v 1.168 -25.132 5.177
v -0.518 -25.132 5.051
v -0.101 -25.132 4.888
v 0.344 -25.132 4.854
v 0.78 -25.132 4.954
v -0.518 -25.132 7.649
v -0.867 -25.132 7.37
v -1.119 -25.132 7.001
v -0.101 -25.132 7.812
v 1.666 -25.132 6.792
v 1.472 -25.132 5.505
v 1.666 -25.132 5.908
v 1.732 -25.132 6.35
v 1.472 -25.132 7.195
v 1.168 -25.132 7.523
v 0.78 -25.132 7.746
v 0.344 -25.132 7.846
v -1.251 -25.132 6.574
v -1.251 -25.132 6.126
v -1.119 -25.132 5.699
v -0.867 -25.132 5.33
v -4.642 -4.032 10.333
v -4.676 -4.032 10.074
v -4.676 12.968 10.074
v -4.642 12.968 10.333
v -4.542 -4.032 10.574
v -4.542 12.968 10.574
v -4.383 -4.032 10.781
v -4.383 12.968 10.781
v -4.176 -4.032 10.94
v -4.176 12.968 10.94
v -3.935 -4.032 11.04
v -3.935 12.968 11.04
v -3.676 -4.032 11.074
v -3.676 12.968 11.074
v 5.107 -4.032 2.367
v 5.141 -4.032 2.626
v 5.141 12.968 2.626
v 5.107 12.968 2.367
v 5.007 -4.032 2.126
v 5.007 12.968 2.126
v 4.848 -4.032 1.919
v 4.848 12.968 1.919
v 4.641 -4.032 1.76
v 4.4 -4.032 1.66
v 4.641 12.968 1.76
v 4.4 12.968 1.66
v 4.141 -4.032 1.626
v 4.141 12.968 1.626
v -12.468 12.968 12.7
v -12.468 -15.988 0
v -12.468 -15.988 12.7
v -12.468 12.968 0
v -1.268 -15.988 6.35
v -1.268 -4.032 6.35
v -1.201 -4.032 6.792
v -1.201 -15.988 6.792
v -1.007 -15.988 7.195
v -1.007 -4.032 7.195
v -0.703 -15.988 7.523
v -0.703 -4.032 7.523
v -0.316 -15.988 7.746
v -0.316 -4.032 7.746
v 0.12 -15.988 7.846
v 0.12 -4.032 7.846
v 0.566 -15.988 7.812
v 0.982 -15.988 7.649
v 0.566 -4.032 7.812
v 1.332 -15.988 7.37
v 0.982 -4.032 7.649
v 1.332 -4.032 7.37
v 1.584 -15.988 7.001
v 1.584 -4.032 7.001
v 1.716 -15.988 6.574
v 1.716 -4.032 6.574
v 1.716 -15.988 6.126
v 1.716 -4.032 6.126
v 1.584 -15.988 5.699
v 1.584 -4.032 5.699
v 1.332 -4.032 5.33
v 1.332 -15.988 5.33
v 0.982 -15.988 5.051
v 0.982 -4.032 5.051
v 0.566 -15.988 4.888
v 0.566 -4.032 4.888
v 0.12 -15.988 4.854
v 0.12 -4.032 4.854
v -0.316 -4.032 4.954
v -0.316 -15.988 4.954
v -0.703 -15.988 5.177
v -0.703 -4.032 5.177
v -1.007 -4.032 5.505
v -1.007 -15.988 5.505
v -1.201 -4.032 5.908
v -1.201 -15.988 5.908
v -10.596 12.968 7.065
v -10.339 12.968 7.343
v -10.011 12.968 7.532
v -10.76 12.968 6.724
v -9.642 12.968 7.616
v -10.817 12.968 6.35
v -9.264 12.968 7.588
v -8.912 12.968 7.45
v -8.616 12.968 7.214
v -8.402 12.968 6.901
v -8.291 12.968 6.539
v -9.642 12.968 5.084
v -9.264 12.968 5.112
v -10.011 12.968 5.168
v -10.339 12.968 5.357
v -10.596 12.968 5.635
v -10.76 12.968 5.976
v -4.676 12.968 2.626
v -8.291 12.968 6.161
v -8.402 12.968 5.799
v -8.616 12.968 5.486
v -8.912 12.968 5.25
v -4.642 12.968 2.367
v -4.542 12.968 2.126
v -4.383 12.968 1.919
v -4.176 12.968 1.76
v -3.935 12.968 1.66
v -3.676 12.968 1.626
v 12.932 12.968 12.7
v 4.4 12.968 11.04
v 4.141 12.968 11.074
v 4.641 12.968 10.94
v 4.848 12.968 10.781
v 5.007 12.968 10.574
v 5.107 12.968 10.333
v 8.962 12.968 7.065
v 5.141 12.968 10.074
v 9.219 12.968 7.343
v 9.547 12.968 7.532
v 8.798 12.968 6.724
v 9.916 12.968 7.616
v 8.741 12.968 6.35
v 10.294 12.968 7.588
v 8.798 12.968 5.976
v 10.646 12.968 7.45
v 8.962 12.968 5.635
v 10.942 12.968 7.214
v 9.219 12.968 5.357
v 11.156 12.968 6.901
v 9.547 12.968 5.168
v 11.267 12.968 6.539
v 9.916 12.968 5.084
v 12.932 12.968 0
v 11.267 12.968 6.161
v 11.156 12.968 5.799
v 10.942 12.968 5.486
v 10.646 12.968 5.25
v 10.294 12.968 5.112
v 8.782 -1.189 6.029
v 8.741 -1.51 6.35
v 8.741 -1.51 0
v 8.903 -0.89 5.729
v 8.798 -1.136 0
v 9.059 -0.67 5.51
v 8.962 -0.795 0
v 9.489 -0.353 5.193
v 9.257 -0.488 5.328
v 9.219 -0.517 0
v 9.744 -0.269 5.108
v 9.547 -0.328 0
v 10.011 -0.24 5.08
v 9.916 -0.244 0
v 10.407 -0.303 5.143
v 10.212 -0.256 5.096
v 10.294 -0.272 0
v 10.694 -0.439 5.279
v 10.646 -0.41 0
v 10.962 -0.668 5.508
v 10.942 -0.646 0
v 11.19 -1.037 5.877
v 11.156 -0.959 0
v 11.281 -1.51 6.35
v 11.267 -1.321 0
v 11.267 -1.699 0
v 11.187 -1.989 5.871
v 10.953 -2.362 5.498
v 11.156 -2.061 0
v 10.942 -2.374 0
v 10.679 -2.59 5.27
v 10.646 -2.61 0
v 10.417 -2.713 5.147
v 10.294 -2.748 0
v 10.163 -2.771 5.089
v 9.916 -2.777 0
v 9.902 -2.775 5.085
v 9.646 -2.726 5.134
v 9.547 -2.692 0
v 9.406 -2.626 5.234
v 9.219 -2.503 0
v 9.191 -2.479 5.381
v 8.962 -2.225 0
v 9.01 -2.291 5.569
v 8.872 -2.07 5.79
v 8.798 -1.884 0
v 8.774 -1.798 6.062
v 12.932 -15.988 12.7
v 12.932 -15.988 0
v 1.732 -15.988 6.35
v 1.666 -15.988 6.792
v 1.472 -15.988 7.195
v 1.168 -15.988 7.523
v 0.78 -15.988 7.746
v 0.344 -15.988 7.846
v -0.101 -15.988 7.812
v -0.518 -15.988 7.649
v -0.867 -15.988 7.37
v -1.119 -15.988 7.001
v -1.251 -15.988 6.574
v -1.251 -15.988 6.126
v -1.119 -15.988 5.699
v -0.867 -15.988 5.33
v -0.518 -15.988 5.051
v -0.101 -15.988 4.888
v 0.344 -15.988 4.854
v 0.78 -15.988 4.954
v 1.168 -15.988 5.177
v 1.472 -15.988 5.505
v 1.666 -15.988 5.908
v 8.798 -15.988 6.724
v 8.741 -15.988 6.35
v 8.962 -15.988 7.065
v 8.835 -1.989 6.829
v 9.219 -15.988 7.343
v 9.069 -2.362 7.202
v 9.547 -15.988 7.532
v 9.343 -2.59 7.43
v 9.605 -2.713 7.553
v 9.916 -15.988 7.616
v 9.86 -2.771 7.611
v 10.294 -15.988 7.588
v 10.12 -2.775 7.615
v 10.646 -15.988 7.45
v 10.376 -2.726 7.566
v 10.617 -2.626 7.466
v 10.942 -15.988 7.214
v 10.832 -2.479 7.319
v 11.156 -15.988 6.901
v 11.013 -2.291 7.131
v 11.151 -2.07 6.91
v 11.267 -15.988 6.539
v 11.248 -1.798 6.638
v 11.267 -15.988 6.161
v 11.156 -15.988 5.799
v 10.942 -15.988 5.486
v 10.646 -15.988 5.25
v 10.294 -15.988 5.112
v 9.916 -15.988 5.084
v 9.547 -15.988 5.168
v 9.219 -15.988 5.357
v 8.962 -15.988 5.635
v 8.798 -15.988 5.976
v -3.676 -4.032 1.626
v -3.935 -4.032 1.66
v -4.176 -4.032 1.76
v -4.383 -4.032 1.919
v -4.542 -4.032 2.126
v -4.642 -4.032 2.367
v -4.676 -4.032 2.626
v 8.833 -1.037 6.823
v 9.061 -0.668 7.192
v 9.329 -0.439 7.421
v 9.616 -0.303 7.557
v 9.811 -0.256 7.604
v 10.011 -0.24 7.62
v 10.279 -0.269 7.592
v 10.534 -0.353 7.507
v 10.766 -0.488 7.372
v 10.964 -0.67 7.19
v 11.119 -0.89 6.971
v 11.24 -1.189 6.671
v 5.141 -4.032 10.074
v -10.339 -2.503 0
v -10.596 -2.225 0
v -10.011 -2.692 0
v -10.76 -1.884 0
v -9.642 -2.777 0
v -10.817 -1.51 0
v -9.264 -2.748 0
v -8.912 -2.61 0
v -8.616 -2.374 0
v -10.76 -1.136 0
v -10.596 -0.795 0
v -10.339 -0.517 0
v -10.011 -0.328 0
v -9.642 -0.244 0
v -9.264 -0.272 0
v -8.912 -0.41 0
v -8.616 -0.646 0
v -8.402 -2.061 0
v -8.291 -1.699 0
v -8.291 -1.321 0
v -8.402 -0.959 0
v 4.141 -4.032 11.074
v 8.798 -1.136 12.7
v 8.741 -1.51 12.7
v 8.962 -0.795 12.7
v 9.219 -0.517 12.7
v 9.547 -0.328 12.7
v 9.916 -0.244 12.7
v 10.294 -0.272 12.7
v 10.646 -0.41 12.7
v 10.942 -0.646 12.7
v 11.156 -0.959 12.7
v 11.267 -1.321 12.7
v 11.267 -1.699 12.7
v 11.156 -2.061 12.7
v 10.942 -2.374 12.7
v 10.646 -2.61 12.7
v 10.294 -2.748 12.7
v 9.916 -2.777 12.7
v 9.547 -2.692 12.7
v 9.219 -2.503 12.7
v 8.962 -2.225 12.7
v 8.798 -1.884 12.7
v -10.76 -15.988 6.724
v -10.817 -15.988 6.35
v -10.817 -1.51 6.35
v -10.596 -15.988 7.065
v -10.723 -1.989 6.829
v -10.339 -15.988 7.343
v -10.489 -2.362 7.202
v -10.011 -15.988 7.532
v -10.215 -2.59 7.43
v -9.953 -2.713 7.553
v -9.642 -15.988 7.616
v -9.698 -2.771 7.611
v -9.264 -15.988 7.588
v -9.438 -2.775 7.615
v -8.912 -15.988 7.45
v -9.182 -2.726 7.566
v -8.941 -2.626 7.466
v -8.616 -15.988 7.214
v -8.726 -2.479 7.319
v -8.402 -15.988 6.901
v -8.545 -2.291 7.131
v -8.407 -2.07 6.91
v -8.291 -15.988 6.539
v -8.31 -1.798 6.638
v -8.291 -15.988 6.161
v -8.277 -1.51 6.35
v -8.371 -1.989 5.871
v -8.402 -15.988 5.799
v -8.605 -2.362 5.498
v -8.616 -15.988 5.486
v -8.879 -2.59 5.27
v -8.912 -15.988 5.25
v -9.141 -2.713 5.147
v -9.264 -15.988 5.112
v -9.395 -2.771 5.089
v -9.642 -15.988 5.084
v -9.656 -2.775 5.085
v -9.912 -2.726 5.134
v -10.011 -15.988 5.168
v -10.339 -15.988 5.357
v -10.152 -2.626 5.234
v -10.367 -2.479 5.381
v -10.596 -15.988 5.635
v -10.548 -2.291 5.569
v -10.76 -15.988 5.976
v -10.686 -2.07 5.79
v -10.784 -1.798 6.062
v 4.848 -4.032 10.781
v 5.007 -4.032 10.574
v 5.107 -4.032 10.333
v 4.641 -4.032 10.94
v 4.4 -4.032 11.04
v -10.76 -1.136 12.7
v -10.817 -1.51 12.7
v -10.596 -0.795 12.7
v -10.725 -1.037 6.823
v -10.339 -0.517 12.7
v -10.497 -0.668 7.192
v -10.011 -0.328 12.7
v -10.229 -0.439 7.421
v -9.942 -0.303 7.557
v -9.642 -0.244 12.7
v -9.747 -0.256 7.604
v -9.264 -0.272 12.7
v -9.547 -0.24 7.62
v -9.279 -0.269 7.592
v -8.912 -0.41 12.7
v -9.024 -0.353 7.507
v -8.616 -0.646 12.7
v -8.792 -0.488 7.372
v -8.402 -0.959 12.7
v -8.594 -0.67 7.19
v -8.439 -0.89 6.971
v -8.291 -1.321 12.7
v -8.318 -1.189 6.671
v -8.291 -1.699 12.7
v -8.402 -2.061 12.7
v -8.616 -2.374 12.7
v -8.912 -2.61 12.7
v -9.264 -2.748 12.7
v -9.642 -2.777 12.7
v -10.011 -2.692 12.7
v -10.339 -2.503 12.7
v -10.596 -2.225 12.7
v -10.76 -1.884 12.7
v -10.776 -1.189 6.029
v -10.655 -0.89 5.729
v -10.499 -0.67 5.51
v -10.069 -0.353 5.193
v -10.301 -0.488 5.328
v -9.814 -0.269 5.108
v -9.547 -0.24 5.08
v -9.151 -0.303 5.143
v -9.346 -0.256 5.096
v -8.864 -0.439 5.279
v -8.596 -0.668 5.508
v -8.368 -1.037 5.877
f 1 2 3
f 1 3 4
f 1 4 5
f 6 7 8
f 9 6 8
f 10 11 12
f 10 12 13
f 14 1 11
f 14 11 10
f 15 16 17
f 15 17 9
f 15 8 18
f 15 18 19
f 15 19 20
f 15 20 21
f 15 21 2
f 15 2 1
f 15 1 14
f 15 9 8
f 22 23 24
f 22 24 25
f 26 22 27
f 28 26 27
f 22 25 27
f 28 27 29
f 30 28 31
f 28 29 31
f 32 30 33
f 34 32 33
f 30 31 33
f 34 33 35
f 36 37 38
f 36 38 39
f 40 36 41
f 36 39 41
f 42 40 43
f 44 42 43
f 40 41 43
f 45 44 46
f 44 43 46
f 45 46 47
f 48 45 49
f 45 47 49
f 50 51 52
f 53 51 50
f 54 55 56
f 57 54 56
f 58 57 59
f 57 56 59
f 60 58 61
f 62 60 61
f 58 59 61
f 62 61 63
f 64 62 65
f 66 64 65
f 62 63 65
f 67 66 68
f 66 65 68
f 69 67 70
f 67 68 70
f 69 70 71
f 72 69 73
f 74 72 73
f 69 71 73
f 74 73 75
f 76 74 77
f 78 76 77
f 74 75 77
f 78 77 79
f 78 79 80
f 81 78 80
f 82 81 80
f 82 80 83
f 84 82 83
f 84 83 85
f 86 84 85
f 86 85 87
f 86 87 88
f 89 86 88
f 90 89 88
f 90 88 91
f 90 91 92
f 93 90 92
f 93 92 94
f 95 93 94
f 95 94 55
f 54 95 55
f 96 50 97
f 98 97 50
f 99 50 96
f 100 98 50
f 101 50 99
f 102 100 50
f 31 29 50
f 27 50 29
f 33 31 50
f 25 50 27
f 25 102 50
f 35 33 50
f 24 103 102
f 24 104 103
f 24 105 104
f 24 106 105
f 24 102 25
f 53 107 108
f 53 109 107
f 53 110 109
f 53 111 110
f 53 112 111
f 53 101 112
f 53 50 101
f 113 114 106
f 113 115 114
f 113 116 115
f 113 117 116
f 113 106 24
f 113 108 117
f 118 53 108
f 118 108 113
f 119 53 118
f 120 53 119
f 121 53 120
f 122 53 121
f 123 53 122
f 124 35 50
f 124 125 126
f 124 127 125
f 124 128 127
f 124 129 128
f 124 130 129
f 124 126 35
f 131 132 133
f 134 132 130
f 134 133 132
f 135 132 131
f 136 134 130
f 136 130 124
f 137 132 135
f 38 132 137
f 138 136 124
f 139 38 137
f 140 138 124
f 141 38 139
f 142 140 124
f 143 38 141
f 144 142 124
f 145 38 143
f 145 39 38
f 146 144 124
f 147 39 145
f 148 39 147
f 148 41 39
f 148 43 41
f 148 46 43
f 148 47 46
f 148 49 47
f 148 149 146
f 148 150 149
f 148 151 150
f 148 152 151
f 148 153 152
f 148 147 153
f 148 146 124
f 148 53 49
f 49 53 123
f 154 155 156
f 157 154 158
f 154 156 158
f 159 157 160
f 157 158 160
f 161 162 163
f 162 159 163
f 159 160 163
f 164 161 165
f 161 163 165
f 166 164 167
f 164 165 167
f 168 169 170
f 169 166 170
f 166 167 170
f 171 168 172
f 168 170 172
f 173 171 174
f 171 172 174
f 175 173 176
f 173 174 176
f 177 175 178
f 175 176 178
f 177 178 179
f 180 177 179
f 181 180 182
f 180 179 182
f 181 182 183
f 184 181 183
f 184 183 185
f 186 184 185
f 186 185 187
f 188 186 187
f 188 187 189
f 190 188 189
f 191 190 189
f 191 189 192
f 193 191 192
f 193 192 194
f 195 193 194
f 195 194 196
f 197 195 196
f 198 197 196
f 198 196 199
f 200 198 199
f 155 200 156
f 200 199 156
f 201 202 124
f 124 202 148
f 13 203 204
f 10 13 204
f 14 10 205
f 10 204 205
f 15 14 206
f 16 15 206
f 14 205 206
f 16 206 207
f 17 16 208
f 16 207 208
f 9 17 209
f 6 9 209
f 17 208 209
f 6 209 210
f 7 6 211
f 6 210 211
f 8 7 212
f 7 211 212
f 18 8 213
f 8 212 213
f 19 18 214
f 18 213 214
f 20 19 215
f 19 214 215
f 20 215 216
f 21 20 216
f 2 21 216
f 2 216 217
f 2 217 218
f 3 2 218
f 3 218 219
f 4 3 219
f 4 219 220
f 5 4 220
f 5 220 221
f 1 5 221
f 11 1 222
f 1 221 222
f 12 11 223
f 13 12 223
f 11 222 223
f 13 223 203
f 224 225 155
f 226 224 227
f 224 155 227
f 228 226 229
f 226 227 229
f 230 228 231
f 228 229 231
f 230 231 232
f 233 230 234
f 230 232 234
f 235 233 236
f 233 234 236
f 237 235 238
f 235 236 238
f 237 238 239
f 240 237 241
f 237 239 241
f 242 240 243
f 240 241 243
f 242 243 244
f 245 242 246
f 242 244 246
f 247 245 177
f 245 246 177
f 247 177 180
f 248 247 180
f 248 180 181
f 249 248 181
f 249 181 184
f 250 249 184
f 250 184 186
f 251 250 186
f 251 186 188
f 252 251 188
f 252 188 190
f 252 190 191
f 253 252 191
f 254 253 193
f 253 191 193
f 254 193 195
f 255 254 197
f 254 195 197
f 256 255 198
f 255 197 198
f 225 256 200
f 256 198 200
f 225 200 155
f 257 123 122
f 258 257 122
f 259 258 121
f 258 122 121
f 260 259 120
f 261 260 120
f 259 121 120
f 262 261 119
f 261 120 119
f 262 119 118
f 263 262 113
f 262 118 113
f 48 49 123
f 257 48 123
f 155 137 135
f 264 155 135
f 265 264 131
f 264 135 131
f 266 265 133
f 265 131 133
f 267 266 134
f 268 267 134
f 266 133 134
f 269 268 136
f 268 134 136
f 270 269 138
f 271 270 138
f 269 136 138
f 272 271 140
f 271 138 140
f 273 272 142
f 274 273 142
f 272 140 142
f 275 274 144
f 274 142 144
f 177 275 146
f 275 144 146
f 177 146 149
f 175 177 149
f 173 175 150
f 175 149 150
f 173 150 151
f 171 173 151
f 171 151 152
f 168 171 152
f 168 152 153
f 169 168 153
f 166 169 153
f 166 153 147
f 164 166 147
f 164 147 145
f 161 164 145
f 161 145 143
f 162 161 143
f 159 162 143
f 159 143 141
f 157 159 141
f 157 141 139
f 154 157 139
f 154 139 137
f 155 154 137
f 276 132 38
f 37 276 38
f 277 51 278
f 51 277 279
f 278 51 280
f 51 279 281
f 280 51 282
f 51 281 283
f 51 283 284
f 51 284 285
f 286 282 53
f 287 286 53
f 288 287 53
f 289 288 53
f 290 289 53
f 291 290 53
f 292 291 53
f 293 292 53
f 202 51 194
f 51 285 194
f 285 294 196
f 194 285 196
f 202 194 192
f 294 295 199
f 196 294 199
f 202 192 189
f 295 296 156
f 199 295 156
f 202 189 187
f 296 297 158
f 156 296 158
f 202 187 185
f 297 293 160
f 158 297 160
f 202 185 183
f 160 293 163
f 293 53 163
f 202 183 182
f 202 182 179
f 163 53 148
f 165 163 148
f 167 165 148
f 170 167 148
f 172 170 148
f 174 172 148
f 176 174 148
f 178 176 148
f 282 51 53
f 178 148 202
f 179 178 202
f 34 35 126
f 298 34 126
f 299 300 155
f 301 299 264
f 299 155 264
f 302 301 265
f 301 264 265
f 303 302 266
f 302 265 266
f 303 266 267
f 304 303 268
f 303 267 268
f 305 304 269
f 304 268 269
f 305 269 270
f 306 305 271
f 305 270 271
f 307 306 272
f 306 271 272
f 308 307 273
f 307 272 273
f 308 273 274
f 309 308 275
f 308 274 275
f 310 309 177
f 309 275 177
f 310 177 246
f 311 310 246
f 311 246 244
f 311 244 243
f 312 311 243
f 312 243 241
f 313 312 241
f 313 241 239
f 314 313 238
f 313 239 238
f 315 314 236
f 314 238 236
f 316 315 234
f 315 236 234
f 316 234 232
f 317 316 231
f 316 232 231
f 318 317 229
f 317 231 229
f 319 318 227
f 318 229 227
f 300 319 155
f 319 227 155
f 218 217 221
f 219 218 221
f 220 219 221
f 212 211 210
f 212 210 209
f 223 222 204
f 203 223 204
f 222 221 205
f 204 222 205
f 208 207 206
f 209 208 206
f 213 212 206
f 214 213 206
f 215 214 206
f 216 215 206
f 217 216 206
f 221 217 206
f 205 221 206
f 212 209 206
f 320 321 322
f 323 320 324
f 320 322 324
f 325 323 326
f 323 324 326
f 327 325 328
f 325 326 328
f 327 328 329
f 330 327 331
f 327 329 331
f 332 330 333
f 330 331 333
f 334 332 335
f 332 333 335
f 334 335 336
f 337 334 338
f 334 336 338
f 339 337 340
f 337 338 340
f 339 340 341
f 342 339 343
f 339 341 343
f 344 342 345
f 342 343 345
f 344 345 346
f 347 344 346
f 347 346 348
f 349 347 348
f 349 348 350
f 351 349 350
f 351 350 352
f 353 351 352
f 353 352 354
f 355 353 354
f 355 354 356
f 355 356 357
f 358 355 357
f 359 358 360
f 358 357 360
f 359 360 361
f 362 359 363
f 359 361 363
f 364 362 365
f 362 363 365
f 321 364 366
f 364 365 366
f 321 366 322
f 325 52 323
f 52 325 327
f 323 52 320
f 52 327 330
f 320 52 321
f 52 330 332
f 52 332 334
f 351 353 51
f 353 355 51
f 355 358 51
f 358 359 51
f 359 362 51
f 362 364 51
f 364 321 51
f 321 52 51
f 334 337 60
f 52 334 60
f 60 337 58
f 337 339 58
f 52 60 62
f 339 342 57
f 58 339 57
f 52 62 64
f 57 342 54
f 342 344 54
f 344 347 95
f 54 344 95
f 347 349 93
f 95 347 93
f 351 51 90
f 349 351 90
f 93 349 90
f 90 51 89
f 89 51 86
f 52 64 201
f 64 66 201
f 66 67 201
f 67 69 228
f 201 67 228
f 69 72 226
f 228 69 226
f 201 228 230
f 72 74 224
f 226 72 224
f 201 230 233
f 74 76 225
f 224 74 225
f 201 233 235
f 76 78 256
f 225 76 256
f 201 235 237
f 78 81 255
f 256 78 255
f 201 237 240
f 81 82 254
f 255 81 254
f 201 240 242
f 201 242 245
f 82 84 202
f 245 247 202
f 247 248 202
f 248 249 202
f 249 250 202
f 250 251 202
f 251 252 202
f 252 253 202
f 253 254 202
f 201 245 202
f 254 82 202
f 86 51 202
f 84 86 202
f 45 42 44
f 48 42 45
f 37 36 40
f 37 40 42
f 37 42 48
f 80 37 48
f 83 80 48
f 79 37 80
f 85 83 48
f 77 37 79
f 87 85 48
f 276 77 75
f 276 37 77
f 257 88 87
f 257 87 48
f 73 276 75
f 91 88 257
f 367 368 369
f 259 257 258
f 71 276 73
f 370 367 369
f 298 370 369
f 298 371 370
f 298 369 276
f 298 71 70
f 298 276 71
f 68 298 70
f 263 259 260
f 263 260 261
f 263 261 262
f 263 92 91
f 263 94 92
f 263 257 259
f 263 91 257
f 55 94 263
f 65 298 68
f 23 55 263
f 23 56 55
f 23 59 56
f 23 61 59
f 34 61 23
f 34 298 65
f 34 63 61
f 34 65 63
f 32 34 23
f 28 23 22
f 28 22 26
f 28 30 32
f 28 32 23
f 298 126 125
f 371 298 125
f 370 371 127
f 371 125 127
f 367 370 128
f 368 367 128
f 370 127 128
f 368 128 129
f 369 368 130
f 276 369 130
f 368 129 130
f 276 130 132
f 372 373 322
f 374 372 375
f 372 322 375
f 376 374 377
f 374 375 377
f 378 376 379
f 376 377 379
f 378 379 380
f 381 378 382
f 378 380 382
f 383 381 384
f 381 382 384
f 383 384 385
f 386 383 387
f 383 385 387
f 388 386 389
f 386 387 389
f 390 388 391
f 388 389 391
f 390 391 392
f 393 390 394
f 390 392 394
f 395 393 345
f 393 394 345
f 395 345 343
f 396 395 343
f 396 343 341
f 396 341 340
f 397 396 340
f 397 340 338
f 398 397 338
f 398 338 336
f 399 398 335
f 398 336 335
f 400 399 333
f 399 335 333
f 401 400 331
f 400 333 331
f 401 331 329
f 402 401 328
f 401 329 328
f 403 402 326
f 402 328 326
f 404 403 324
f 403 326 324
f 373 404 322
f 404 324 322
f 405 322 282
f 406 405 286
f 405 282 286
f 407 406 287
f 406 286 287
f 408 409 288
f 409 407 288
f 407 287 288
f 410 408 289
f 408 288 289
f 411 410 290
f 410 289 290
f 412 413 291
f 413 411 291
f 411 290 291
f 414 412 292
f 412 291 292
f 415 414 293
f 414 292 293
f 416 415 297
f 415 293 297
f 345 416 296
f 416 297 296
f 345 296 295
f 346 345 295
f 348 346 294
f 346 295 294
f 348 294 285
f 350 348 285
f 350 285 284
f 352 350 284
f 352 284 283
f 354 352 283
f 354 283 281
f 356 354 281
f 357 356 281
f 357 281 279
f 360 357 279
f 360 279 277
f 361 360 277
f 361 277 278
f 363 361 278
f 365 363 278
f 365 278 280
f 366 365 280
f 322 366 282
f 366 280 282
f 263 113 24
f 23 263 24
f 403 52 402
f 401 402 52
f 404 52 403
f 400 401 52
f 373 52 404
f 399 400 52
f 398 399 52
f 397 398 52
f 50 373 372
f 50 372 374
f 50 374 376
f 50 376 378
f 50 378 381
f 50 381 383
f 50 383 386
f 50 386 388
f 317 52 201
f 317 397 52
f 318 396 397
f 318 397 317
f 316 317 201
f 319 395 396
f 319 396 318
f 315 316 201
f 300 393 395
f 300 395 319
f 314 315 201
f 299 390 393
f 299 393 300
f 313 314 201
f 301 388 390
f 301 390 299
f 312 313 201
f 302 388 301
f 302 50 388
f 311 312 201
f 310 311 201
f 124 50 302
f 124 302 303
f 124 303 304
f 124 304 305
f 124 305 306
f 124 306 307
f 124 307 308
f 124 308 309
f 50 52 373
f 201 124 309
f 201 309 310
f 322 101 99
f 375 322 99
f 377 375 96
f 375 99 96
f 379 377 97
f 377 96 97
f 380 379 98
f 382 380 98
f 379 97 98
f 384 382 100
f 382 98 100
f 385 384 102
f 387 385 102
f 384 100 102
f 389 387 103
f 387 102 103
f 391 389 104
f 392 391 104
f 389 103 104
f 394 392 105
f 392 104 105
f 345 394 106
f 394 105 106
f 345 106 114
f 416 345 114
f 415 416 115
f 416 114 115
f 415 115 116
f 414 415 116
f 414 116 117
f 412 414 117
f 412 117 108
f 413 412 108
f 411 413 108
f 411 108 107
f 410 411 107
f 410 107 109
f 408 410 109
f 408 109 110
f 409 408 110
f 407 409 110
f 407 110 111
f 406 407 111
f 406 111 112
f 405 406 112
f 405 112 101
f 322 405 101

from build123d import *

# Parameters (mm, degrees)
F0_W     = 25.4
F0_H     = 28.956
F1_DEPTH = 12.7
F3_D     = 2.54
F4_D     = 3
F6_D     = 2.54
F7_DEPTH = 9.144
F9_DEPTH = 17


with BuildPart() as f1:
    # F0 (on Top) → F1 (new body)
    with BuildSketch(Plane.XY):
        with Locations((0.232301, -1.510053)):
            Rectangle(F0_W, F0_H)
    extrude(amount=F1_DEPTH)

    # F3 (through all)
    with Locations(Plane.XZ.offset(15.988053)):
        with Locations((-9.546699, 6.35), (10.011301, 6.35)):
            Hole(F3_D / 2)

    # F4 (through all)
    with Locations(Plane.XZ.offset(15.988053)):
        with Locations((0.232301, 6.35)):
            Hole(F4_D / 2)

    # F6 (through all)
    with Locations(Plane.XY.offset(12.7)):
        with Locations((-9.546699, -1.510053), (10.011301, -1.510053)):
            Hole(F6_D / 2)

    # F8 (on face) → F9 (cut)
    with BuildSketch(Plane(origin=(0, 12.967947, 0), x_dir=(-1, 0, 0), z_dir=(0, 1, 0))):
        with BuildLine():
            Line((-4.140937, 1.625796), (3.676335, 1.625796))
            ThreePointArc((3.676335, 1.625796), (4.383442, 1.918689), (4.676335, 2.625796))
            Line((4.676335, 2.625796), (4.676335, 10.074204))
            ThreePointArc((4.676335, 10.074204), (4.383442, 10.781311), (3.676335, 11.074204))
            Line((3.676335, 11.074204), (-4.140937, 11.074204))
            ThreePointArc((-4.140937, 11.074204), (-4.848044, 10.781311), (-5.140937, 10.074204))
            Line((-5.140937, 10.074204), (-5.140937, 2.625796))
            ThreePointArc((-5.140937, 2.625796), (-4.848044, 1.918689), (-4.140937, 1.625796))
        make_face()
    extrude(amount=-F9_DEPTH, mode=Mode.SUBTRACT)


with BuildPart() as f7:
    # F2 (on face) → F7 (new body)
    with BuildSketch(Plane.XZ.offset(15.988053)):
        with BuildLine():
            Line((1.732301, 6.35), (0.232301, 6.35))
            Line((0.232301, 6.35), (-1.267699, 6.35))
            ThreePointArc((-1.267699, 6.35), (0.232301, 4.85), (1.732301, 6.35))
        make_face()
        with BuildLine():
            Line((-1.267699, 6.35), (0.232301, 6.35))
            Line((0.232301, 6.35), (1.732301, 6.35))
            ThreePointArc((1.732301, 6.35), (0.232301, 7.85), (-1.267699, 6.35))
        make_face()
    extrude(amount=F7_DEPTH)


solid = Compound([f1.part, f7.part])
